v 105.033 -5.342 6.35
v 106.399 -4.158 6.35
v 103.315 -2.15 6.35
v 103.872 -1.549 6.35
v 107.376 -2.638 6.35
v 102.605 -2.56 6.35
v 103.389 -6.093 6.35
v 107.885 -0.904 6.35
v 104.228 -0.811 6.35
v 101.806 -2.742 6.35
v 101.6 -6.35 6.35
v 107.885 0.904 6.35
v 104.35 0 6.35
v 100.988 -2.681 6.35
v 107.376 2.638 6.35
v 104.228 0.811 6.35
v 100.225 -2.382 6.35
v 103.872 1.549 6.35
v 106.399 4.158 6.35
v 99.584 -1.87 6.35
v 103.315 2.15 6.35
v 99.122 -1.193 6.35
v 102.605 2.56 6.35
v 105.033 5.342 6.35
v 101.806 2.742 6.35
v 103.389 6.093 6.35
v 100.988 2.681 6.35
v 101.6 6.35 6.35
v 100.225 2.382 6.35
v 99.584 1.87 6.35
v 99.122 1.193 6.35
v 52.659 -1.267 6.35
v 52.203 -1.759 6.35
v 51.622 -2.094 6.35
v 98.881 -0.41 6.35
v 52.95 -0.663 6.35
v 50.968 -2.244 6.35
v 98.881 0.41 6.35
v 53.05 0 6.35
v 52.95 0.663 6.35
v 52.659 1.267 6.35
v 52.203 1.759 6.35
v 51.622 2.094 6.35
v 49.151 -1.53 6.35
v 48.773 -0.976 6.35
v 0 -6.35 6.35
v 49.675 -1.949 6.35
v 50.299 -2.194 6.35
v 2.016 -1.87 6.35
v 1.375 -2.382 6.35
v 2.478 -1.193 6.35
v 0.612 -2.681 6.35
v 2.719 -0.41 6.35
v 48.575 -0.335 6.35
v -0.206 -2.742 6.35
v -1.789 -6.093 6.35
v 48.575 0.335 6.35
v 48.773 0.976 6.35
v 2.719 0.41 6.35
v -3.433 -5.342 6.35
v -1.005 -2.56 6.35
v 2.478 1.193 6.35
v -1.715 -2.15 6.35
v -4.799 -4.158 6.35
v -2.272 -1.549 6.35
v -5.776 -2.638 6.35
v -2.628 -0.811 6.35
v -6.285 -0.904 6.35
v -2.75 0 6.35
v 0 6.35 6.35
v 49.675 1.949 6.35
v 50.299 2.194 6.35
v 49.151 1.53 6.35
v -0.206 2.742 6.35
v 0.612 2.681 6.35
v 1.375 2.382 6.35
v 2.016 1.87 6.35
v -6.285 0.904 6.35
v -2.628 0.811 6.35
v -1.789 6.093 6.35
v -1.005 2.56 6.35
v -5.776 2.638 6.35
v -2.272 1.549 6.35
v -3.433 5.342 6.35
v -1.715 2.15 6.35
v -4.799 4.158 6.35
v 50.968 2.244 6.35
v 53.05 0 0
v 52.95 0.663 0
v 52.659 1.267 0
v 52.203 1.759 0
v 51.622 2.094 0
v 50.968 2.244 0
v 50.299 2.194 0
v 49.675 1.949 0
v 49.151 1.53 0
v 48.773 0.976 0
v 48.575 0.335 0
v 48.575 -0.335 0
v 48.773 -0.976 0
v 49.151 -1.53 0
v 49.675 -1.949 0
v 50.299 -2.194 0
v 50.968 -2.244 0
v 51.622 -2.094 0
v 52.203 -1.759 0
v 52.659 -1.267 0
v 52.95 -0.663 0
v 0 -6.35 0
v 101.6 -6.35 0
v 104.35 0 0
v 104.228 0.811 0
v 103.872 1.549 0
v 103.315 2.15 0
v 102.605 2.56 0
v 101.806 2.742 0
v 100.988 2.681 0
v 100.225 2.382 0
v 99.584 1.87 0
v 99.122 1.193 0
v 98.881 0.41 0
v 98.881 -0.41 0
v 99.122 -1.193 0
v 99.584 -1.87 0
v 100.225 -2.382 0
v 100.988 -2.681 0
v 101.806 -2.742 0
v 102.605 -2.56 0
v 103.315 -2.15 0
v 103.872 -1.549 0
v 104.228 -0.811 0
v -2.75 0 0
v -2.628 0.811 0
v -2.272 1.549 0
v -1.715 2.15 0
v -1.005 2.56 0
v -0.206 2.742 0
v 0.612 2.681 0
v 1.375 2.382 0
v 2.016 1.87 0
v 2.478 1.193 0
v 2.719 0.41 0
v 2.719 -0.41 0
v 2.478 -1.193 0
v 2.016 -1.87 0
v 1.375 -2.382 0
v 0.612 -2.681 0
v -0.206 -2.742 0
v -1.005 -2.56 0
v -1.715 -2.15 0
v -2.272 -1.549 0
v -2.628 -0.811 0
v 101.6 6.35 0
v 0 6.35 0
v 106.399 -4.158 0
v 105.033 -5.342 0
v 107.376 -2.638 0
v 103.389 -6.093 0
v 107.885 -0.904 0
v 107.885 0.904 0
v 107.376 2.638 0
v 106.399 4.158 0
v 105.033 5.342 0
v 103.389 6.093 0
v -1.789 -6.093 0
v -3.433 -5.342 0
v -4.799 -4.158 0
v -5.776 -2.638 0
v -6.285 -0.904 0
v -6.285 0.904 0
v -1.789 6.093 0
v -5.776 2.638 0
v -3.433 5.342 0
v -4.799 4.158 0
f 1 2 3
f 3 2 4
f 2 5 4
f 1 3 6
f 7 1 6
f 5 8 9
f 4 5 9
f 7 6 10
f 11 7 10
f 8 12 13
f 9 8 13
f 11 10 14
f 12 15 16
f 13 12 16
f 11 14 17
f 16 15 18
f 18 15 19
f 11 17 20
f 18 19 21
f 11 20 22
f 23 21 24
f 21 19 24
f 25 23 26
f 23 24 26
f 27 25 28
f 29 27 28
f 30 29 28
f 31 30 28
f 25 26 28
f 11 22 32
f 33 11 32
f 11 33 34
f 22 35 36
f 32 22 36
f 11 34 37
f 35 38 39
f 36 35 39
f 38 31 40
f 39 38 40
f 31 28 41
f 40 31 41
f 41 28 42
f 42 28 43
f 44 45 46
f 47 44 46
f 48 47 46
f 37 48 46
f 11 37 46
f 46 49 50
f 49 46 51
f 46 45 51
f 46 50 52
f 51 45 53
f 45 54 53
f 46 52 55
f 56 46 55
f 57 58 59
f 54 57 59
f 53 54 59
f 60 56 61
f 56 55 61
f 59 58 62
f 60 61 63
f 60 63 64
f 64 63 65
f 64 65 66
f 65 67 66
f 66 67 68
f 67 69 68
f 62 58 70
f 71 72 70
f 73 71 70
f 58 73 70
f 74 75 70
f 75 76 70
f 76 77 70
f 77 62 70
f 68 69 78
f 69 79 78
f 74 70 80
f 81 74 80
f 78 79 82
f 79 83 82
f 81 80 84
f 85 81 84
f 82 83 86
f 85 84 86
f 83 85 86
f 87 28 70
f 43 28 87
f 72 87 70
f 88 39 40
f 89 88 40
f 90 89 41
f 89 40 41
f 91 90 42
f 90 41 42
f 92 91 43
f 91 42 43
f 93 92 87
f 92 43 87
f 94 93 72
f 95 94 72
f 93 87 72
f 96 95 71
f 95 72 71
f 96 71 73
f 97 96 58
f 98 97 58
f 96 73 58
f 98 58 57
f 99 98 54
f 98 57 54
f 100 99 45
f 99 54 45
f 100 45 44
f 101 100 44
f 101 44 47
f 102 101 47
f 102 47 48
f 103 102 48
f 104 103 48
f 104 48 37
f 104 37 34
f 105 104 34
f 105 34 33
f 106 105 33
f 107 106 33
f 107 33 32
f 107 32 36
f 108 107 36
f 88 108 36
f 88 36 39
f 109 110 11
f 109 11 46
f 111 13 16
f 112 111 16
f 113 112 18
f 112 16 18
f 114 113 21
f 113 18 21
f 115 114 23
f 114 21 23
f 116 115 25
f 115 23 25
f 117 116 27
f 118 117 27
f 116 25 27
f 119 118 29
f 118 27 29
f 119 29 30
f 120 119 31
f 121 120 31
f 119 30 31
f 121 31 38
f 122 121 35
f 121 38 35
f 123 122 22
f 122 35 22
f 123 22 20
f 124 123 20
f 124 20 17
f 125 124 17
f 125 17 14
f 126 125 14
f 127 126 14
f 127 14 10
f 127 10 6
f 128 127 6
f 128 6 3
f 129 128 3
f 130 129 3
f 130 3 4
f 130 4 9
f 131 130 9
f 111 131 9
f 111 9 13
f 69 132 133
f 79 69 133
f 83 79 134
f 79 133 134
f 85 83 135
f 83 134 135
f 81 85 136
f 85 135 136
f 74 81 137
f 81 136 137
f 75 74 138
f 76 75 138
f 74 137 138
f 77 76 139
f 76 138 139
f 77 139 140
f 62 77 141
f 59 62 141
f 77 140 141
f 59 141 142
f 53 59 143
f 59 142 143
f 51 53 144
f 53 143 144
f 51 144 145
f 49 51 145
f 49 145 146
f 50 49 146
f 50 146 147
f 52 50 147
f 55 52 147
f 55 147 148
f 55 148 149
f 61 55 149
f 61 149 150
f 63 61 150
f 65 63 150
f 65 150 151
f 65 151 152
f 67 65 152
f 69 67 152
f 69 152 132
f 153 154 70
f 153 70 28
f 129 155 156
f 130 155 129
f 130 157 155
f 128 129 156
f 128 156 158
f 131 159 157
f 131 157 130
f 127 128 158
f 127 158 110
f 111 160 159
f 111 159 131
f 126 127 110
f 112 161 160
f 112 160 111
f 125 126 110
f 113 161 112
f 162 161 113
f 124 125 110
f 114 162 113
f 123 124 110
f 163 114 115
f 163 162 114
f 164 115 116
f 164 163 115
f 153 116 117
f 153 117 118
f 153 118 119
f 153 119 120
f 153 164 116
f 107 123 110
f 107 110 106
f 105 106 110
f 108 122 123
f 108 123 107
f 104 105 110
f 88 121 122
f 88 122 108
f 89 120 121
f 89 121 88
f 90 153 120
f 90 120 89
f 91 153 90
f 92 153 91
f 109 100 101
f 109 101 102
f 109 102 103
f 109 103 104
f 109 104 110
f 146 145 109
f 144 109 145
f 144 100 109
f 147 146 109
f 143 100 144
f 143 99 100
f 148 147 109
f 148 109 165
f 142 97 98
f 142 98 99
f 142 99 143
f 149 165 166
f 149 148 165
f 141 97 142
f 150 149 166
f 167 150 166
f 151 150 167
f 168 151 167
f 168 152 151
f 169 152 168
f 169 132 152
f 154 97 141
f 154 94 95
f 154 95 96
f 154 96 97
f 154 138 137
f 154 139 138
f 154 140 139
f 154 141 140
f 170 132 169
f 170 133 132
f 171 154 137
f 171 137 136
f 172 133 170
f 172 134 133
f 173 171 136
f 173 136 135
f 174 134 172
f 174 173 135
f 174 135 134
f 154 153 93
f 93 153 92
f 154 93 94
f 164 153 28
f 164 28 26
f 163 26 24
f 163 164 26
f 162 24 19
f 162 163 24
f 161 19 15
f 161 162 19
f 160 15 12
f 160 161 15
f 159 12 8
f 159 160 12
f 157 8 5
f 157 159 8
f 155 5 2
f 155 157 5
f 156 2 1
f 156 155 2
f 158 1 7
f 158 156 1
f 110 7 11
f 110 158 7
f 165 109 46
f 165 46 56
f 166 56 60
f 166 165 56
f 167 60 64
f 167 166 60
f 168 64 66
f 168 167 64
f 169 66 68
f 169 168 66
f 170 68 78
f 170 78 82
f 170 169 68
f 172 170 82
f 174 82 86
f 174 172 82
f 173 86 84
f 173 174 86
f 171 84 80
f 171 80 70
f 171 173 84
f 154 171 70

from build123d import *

# Parameters (mm, degrees)
BOSS_EXTRUDE1_DEPTH  = 6.35
M5_CLEARANCE_HOLE1_D = 5.5
M4_CLEARANCE_HOLE1_D = 4.5
M5_CLEARANCE_HOLE2_D = 5.5


with BuildPart() as part:
    # Sketch1 → Boss-Extrude1 (new body)
    with BuildSketch(Plane.XY):
        with BuildLine():
            Line((0, 6.35), (101.6, 6.35))
            ThreePointArc((101.6, 6.35), (107.95, 0), (101.6, -6.35))
            Line((101.6, -6.35), (0, -6.35))
            ThreePointArc((0, -6.35), (-6.35, 0), (0, 6.35))
        make_face()
    extrude(amount=BOSS_EXTRUDE1_DEPTH)

    # M5 Clearance Hole1 (through all)
    with Locations(Plane(origin=(0, 0, 0), x_dir=(-1, 0, 0), z_dir=(0, 0, -1))):
        with Locations((-101.6, 0)):
            Hole(M5_CLEARANCE_HOLE1_D / 2)

    # M4 Clearance Hole1 (through all)
    with Locations(Plane(origin=(0, 0, 0), x_dir=(-1, 0, 0), z_dir=(0, 0, -1))):
        with Locations((-50.8, 0)):
            Hole(M4_CLEARANCE_HOLE1_D / 2)

    # M5 Clearance Hole2 (through all)
    with Locations(Plane.XY.offset(6.35)):
        with Locations((0, 0)):
            Hole(M5_CLEARANCE_HOLE2_D / 2)


solid = part.part
